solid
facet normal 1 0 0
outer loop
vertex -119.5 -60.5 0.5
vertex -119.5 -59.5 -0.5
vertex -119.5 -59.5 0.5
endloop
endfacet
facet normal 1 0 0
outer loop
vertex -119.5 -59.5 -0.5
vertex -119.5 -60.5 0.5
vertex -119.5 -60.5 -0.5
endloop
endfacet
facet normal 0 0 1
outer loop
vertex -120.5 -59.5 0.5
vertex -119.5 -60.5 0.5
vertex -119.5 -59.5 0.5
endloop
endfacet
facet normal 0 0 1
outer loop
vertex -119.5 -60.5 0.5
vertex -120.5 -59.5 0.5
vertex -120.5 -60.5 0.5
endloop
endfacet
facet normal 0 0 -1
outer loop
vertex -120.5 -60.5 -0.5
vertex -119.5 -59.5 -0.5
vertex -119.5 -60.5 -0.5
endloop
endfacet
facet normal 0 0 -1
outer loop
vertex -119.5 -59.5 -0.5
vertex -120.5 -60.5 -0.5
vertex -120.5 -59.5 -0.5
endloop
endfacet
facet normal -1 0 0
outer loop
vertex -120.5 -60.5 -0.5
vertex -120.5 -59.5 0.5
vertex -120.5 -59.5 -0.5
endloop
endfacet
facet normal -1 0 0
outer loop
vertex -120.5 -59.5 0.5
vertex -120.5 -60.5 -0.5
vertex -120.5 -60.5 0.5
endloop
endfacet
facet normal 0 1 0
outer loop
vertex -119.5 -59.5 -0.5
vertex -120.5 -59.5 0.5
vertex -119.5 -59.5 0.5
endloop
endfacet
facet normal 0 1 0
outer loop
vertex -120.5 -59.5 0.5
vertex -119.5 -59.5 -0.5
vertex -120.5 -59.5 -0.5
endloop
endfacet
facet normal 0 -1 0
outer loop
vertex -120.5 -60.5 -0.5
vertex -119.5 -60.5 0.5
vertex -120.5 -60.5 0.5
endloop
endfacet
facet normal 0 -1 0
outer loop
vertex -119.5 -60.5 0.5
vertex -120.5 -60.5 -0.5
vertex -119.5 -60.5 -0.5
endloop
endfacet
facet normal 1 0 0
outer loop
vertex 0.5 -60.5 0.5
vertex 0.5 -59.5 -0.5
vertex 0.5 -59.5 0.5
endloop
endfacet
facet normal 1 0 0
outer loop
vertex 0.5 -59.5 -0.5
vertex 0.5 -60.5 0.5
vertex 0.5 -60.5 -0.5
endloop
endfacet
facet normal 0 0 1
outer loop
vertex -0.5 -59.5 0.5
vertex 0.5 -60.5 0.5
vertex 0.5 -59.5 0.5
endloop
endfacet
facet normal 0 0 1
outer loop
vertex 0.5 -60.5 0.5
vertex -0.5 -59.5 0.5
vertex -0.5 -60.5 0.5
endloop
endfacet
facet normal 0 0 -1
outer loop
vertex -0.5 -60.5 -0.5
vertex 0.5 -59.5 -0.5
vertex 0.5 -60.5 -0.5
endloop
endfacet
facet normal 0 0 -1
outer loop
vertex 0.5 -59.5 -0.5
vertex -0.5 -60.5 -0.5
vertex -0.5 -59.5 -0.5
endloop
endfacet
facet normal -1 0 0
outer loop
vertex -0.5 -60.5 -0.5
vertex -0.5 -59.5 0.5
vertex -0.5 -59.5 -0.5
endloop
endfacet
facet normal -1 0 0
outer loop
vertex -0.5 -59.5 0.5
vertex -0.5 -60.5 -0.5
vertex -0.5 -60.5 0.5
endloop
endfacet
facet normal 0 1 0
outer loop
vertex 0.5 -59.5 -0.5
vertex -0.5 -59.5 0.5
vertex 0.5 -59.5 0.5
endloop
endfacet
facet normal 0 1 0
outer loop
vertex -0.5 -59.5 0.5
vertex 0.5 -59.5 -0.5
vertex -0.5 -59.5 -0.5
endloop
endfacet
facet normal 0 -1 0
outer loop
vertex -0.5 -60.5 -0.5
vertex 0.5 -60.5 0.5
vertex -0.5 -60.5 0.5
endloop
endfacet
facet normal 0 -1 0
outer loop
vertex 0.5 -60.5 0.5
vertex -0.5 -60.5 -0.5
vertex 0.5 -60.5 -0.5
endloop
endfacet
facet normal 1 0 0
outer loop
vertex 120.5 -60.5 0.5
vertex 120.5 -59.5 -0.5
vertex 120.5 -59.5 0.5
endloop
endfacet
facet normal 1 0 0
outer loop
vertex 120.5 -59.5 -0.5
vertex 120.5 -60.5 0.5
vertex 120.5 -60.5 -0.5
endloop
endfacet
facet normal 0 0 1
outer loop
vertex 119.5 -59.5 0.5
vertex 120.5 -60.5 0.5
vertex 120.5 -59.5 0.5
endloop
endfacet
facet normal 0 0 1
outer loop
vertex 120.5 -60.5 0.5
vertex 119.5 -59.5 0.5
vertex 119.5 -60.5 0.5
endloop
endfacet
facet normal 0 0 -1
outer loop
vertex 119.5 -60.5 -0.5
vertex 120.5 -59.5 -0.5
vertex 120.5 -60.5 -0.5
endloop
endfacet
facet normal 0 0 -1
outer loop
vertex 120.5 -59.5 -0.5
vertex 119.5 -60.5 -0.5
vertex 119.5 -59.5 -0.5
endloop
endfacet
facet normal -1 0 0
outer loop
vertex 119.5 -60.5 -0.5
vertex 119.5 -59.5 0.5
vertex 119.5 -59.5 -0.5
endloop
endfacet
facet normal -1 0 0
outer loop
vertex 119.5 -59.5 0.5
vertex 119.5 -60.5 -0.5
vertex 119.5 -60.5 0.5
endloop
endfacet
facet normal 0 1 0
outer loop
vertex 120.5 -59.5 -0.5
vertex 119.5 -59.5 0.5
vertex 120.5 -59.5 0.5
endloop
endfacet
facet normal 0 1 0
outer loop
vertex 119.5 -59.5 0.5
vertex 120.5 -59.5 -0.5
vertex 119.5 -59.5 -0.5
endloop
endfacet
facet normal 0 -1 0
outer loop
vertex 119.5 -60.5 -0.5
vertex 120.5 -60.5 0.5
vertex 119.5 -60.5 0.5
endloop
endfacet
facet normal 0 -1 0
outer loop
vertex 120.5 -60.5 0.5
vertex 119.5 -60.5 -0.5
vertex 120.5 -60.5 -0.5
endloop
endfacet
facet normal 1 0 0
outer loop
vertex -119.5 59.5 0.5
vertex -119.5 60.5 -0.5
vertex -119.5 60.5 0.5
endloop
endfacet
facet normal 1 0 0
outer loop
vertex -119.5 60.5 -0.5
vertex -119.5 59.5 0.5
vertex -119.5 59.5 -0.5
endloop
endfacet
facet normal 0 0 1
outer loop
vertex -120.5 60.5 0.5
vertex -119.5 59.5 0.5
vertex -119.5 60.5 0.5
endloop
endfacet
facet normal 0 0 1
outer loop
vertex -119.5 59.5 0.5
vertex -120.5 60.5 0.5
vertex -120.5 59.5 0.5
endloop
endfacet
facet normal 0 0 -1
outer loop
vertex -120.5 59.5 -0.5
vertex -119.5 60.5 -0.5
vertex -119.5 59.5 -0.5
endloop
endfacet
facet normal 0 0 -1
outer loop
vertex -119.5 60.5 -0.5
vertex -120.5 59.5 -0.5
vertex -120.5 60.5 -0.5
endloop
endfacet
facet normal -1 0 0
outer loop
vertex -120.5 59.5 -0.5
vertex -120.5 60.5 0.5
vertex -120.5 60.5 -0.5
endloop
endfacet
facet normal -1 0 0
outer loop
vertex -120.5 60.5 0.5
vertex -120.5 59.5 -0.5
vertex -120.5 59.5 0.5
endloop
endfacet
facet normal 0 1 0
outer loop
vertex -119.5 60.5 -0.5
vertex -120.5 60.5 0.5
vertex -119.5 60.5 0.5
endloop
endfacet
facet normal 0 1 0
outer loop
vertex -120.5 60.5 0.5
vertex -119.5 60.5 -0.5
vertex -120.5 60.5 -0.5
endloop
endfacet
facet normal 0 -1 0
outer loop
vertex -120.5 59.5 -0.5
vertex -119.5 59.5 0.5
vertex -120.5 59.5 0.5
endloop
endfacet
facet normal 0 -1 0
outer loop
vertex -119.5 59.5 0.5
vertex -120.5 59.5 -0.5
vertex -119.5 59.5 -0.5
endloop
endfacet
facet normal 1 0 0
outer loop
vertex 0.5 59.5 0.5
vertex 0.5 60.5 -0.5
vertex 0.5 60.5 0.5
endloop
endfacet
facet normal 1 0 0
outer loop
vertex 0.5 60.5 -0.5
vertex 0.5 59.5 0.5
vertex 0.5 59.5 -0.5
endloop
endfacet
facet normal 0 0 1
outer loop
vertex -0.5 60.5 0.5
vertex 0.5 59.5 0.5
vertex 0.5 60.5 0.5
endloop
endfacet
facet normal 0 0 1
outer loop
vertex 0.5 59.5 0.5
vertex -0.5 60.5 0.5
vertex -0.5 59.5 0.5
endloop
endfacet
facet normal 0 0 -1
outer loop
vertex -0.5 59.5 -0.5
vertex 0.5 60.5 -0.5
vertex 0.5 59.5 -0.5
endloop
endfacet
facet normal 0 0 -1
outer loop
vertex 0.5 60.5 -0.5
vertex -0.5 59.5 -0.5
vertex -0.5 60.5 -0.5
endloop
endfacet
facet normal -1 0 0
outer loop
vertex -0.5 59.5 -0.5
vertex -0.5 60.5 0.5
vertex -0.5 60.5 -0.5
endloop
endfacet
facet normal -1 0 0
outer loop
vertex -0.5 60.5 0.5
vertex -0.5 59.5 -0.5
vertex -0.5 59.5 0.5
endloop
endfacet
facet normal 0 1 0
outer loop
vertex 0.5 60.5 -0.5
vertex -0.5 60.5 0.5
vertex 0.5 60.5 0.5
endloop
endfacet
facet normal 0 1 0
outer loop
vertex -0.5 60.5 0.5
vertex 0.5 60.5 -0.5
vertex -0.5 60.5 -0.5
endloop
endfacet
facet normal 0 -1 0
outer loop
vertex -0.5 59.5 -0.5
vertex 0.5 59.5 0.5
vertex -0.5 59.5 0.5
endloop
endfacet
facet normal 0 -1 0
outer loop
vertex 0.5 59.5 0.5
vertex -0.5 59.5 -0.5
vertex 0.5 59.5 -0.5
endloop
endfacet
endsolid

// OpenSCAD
// design_20251106_153529 - Generated by Kalki Design Engine
// Generated: 2025-11-06T15:35:29.348400
// Design Type: robotics


// Preview helpers (only rendered in OpenSCAD preview mode)
module preview_axes(axis_len=120) {
    color([1, 0, 0, 0.3]) cube([axis_len, 2, 2], center=true); // X-axis
    color([0, 1, 0, 0.3]) cube([2, axis_len, 2], center=true); // Y-axis
    color([0, 0, 1, 0.3]) cube([2, 2, axis_len], center=true); // Z-axis
}

module preview_origin_marker(size=4) {
    color([1, 0.5, 0, 0.5]) sphere(r=size);
}

// Mechanical component libraries
module servo_motor(length=60, diameter=40, shaft_diameter=6, shaft_length=20) {
    // Motor body
    color([0.3, 0.3, 0.3]) cylinder(h=length, d=diameter, center=true);
    // Mounting flanges
    color([0.4, 0.4, 0.4]) {
        translate([0, 0, length/2 + 2]) cylinder(h=4, d=diameter + 10, center=true);
        translate([0, 0, -length/2 - 2]) cylinder(h=4, d=diameter + 10, center=true);
    }
    // Shaft
    color([0.8, 0.8, 0.8]) translate([0, 0, length/2 + shaft_length/2]) cylinder(h=shaft_length, d=shaft_diameter, center=true);
    // Mounting holes
    for (angle = [0, 90, 180, 270]) {
        rotate([0, 0, angle]) translate([diameter/2 + 5, 0, 0]) cylinder(h=length + 10, d=3, center=true);
    }
}

module bearing(outer_diameter=30, inner_diameter=10, thickness=8) {
    // Outer race
    color([0.6, 0.6, 0.6]) difference() {
        cylinder(h=thickness, d=outer_diameter, center=true);
        cylinder(h=thickness + 2, d=inner_diameter, center=true);
    }
    // Inner race
    color([0.7, 0.7, 0.7]) cylinder(h=thickness - 2, d=inner_diameter + 4, center=true);
    // Balls (simplified)
    color([0.9, 0.9, 0.9]) for (angle = [0:45:315]) {
        rotate([0, 0, angle]) translate([(outer_diameter + inner_diameter)/4, 0, 0]) sphere(r=2);
    }
}

module gear(radius=25, thickness=10, teeth=20) {
    // Gear body
    color([0.4, 0.4, 0.4]) cylinder(h=thickness, d=radius*2, center=true);
    // Teeth (simplified)
    color([0.3, 0.3, 0.3]) for (angle = [0:360/teeth:359]) {
        rotate([0, 0, angle]) translate([radius - 2, 0, 0]) cube([4, 3, thickness], center=true);
    }
    // Center hole
    color([0.2, 0.2, 0.2]) cylinder(h=thickness + 2, d=8, center=true);
}

module harmonic_drive(cup_diameter=60, flex_spline_diameter=50, thickness=15) {
    // Wave generator (simplified)
    color([0.5, 0.5, 0.5]) cylinder(h=thickness, d=cup_diameter * 0.7, center=true);
    // Flex spline
    color([0.6, 0.6, 0.6]) cylinder(h=thickness - 2, d=flex_spline_diameter, center=true);
    // Circular spline
    color([0.4, 0.4, 0.4]) difference() {
        cylinder(h=thickness - 4, d=cup_diameter, center=true);
        cylinder(h=thickness, d=flex_spline_diameter + 5, center=true);
    }
}

module robotic_link(length=200, diameter=40, wall_thickness=3) {
    // Hollow cylindrical link
    color([0.8, 0.8, 0.9]) difference() {
        cylinder(h=length, d=diameter, center=true);
        cylinder(h=length + 2, d=diameter - wall_thickness*2, center=true);
    }
    // End flanges
    color([0.7, 0.7, 0.8]) {
        translate([0, 0, length/2]) cylinder(h=6, d=diameter + 10, center=true);
        translate([0, 0, -length/2]) cylinder(h=6, d=diameter + 10, center=true);
    }
    // Mounting holes
    for (z_pos = [-length/3, 0, length/3]) {
        translate([0, 0, z_pos]) for (angle = [0, 90, 180, 270]) {
            rotate([0, 0, angle]) translate([diameter/2 + 5, 0, 0]) cylinder(h=8, d=4, center=true);
        }
    }
}

module end_effector(gripper_width=80, gripper_length=60, finger_length=40) {
    // Base
    color([0.3, 0.3, 0.3]) cube([gripper_width, gripper_length, 20], center=true);
    // Fingers
    color([0.5, 0.5, 0.5]) {
        translate([-gripper_width/4, gripper_length/2 + finger_length/2, 10]) cube([8, finger_length, 4], center=true);
        translate([gripper_width/4, gripper_length/2 + finger_length/2, 10]) cube([8, finger_length, 4], center=true);
    }
    // Actuator
    translate([0, -gripper_length/4, 15]) servo_motor(30, 25, 4, 10);
}

// Component 1: chassis
module component_0() {
    // Type: Provides chassis functionality
    cube([1.0, 1.0, 1.0], center=true);
}

// Component 2: actuators
module component_1() {
    // Type: Provides actuators functionality
    cube([1.0, 1.0, 1.0], center=true);
}

// Component 3: sensors
module component_2() {
    // Type: Provides sensors functionality
    cube([1.0, 1.0, 1.0], center=true);
}

// Component 4: controller
module component_3() {
    // Type: Provides controller functionality
    cube([1.0, 1.0, 1.0], center=true);
}

// Component 5: power
module component_4() {
    // Type: Provides power functionality
    cube([1.0, 1.0, 1.0], center=true);
}

// Assembly
translate([-120.00, -60.00, 0]) component_0();
translate([0.00, -60.00, 0]) component_1();
translate([120.00, -60.00, 0]) component_2();
translate([-120.00, 60.00, 0]) component_3();
translate([0.00, 60.00, 0]) component_4();


if ($preview) {
    preview_axes(axis_len=360.00);
    preview_origin_marker(size=6);
}
